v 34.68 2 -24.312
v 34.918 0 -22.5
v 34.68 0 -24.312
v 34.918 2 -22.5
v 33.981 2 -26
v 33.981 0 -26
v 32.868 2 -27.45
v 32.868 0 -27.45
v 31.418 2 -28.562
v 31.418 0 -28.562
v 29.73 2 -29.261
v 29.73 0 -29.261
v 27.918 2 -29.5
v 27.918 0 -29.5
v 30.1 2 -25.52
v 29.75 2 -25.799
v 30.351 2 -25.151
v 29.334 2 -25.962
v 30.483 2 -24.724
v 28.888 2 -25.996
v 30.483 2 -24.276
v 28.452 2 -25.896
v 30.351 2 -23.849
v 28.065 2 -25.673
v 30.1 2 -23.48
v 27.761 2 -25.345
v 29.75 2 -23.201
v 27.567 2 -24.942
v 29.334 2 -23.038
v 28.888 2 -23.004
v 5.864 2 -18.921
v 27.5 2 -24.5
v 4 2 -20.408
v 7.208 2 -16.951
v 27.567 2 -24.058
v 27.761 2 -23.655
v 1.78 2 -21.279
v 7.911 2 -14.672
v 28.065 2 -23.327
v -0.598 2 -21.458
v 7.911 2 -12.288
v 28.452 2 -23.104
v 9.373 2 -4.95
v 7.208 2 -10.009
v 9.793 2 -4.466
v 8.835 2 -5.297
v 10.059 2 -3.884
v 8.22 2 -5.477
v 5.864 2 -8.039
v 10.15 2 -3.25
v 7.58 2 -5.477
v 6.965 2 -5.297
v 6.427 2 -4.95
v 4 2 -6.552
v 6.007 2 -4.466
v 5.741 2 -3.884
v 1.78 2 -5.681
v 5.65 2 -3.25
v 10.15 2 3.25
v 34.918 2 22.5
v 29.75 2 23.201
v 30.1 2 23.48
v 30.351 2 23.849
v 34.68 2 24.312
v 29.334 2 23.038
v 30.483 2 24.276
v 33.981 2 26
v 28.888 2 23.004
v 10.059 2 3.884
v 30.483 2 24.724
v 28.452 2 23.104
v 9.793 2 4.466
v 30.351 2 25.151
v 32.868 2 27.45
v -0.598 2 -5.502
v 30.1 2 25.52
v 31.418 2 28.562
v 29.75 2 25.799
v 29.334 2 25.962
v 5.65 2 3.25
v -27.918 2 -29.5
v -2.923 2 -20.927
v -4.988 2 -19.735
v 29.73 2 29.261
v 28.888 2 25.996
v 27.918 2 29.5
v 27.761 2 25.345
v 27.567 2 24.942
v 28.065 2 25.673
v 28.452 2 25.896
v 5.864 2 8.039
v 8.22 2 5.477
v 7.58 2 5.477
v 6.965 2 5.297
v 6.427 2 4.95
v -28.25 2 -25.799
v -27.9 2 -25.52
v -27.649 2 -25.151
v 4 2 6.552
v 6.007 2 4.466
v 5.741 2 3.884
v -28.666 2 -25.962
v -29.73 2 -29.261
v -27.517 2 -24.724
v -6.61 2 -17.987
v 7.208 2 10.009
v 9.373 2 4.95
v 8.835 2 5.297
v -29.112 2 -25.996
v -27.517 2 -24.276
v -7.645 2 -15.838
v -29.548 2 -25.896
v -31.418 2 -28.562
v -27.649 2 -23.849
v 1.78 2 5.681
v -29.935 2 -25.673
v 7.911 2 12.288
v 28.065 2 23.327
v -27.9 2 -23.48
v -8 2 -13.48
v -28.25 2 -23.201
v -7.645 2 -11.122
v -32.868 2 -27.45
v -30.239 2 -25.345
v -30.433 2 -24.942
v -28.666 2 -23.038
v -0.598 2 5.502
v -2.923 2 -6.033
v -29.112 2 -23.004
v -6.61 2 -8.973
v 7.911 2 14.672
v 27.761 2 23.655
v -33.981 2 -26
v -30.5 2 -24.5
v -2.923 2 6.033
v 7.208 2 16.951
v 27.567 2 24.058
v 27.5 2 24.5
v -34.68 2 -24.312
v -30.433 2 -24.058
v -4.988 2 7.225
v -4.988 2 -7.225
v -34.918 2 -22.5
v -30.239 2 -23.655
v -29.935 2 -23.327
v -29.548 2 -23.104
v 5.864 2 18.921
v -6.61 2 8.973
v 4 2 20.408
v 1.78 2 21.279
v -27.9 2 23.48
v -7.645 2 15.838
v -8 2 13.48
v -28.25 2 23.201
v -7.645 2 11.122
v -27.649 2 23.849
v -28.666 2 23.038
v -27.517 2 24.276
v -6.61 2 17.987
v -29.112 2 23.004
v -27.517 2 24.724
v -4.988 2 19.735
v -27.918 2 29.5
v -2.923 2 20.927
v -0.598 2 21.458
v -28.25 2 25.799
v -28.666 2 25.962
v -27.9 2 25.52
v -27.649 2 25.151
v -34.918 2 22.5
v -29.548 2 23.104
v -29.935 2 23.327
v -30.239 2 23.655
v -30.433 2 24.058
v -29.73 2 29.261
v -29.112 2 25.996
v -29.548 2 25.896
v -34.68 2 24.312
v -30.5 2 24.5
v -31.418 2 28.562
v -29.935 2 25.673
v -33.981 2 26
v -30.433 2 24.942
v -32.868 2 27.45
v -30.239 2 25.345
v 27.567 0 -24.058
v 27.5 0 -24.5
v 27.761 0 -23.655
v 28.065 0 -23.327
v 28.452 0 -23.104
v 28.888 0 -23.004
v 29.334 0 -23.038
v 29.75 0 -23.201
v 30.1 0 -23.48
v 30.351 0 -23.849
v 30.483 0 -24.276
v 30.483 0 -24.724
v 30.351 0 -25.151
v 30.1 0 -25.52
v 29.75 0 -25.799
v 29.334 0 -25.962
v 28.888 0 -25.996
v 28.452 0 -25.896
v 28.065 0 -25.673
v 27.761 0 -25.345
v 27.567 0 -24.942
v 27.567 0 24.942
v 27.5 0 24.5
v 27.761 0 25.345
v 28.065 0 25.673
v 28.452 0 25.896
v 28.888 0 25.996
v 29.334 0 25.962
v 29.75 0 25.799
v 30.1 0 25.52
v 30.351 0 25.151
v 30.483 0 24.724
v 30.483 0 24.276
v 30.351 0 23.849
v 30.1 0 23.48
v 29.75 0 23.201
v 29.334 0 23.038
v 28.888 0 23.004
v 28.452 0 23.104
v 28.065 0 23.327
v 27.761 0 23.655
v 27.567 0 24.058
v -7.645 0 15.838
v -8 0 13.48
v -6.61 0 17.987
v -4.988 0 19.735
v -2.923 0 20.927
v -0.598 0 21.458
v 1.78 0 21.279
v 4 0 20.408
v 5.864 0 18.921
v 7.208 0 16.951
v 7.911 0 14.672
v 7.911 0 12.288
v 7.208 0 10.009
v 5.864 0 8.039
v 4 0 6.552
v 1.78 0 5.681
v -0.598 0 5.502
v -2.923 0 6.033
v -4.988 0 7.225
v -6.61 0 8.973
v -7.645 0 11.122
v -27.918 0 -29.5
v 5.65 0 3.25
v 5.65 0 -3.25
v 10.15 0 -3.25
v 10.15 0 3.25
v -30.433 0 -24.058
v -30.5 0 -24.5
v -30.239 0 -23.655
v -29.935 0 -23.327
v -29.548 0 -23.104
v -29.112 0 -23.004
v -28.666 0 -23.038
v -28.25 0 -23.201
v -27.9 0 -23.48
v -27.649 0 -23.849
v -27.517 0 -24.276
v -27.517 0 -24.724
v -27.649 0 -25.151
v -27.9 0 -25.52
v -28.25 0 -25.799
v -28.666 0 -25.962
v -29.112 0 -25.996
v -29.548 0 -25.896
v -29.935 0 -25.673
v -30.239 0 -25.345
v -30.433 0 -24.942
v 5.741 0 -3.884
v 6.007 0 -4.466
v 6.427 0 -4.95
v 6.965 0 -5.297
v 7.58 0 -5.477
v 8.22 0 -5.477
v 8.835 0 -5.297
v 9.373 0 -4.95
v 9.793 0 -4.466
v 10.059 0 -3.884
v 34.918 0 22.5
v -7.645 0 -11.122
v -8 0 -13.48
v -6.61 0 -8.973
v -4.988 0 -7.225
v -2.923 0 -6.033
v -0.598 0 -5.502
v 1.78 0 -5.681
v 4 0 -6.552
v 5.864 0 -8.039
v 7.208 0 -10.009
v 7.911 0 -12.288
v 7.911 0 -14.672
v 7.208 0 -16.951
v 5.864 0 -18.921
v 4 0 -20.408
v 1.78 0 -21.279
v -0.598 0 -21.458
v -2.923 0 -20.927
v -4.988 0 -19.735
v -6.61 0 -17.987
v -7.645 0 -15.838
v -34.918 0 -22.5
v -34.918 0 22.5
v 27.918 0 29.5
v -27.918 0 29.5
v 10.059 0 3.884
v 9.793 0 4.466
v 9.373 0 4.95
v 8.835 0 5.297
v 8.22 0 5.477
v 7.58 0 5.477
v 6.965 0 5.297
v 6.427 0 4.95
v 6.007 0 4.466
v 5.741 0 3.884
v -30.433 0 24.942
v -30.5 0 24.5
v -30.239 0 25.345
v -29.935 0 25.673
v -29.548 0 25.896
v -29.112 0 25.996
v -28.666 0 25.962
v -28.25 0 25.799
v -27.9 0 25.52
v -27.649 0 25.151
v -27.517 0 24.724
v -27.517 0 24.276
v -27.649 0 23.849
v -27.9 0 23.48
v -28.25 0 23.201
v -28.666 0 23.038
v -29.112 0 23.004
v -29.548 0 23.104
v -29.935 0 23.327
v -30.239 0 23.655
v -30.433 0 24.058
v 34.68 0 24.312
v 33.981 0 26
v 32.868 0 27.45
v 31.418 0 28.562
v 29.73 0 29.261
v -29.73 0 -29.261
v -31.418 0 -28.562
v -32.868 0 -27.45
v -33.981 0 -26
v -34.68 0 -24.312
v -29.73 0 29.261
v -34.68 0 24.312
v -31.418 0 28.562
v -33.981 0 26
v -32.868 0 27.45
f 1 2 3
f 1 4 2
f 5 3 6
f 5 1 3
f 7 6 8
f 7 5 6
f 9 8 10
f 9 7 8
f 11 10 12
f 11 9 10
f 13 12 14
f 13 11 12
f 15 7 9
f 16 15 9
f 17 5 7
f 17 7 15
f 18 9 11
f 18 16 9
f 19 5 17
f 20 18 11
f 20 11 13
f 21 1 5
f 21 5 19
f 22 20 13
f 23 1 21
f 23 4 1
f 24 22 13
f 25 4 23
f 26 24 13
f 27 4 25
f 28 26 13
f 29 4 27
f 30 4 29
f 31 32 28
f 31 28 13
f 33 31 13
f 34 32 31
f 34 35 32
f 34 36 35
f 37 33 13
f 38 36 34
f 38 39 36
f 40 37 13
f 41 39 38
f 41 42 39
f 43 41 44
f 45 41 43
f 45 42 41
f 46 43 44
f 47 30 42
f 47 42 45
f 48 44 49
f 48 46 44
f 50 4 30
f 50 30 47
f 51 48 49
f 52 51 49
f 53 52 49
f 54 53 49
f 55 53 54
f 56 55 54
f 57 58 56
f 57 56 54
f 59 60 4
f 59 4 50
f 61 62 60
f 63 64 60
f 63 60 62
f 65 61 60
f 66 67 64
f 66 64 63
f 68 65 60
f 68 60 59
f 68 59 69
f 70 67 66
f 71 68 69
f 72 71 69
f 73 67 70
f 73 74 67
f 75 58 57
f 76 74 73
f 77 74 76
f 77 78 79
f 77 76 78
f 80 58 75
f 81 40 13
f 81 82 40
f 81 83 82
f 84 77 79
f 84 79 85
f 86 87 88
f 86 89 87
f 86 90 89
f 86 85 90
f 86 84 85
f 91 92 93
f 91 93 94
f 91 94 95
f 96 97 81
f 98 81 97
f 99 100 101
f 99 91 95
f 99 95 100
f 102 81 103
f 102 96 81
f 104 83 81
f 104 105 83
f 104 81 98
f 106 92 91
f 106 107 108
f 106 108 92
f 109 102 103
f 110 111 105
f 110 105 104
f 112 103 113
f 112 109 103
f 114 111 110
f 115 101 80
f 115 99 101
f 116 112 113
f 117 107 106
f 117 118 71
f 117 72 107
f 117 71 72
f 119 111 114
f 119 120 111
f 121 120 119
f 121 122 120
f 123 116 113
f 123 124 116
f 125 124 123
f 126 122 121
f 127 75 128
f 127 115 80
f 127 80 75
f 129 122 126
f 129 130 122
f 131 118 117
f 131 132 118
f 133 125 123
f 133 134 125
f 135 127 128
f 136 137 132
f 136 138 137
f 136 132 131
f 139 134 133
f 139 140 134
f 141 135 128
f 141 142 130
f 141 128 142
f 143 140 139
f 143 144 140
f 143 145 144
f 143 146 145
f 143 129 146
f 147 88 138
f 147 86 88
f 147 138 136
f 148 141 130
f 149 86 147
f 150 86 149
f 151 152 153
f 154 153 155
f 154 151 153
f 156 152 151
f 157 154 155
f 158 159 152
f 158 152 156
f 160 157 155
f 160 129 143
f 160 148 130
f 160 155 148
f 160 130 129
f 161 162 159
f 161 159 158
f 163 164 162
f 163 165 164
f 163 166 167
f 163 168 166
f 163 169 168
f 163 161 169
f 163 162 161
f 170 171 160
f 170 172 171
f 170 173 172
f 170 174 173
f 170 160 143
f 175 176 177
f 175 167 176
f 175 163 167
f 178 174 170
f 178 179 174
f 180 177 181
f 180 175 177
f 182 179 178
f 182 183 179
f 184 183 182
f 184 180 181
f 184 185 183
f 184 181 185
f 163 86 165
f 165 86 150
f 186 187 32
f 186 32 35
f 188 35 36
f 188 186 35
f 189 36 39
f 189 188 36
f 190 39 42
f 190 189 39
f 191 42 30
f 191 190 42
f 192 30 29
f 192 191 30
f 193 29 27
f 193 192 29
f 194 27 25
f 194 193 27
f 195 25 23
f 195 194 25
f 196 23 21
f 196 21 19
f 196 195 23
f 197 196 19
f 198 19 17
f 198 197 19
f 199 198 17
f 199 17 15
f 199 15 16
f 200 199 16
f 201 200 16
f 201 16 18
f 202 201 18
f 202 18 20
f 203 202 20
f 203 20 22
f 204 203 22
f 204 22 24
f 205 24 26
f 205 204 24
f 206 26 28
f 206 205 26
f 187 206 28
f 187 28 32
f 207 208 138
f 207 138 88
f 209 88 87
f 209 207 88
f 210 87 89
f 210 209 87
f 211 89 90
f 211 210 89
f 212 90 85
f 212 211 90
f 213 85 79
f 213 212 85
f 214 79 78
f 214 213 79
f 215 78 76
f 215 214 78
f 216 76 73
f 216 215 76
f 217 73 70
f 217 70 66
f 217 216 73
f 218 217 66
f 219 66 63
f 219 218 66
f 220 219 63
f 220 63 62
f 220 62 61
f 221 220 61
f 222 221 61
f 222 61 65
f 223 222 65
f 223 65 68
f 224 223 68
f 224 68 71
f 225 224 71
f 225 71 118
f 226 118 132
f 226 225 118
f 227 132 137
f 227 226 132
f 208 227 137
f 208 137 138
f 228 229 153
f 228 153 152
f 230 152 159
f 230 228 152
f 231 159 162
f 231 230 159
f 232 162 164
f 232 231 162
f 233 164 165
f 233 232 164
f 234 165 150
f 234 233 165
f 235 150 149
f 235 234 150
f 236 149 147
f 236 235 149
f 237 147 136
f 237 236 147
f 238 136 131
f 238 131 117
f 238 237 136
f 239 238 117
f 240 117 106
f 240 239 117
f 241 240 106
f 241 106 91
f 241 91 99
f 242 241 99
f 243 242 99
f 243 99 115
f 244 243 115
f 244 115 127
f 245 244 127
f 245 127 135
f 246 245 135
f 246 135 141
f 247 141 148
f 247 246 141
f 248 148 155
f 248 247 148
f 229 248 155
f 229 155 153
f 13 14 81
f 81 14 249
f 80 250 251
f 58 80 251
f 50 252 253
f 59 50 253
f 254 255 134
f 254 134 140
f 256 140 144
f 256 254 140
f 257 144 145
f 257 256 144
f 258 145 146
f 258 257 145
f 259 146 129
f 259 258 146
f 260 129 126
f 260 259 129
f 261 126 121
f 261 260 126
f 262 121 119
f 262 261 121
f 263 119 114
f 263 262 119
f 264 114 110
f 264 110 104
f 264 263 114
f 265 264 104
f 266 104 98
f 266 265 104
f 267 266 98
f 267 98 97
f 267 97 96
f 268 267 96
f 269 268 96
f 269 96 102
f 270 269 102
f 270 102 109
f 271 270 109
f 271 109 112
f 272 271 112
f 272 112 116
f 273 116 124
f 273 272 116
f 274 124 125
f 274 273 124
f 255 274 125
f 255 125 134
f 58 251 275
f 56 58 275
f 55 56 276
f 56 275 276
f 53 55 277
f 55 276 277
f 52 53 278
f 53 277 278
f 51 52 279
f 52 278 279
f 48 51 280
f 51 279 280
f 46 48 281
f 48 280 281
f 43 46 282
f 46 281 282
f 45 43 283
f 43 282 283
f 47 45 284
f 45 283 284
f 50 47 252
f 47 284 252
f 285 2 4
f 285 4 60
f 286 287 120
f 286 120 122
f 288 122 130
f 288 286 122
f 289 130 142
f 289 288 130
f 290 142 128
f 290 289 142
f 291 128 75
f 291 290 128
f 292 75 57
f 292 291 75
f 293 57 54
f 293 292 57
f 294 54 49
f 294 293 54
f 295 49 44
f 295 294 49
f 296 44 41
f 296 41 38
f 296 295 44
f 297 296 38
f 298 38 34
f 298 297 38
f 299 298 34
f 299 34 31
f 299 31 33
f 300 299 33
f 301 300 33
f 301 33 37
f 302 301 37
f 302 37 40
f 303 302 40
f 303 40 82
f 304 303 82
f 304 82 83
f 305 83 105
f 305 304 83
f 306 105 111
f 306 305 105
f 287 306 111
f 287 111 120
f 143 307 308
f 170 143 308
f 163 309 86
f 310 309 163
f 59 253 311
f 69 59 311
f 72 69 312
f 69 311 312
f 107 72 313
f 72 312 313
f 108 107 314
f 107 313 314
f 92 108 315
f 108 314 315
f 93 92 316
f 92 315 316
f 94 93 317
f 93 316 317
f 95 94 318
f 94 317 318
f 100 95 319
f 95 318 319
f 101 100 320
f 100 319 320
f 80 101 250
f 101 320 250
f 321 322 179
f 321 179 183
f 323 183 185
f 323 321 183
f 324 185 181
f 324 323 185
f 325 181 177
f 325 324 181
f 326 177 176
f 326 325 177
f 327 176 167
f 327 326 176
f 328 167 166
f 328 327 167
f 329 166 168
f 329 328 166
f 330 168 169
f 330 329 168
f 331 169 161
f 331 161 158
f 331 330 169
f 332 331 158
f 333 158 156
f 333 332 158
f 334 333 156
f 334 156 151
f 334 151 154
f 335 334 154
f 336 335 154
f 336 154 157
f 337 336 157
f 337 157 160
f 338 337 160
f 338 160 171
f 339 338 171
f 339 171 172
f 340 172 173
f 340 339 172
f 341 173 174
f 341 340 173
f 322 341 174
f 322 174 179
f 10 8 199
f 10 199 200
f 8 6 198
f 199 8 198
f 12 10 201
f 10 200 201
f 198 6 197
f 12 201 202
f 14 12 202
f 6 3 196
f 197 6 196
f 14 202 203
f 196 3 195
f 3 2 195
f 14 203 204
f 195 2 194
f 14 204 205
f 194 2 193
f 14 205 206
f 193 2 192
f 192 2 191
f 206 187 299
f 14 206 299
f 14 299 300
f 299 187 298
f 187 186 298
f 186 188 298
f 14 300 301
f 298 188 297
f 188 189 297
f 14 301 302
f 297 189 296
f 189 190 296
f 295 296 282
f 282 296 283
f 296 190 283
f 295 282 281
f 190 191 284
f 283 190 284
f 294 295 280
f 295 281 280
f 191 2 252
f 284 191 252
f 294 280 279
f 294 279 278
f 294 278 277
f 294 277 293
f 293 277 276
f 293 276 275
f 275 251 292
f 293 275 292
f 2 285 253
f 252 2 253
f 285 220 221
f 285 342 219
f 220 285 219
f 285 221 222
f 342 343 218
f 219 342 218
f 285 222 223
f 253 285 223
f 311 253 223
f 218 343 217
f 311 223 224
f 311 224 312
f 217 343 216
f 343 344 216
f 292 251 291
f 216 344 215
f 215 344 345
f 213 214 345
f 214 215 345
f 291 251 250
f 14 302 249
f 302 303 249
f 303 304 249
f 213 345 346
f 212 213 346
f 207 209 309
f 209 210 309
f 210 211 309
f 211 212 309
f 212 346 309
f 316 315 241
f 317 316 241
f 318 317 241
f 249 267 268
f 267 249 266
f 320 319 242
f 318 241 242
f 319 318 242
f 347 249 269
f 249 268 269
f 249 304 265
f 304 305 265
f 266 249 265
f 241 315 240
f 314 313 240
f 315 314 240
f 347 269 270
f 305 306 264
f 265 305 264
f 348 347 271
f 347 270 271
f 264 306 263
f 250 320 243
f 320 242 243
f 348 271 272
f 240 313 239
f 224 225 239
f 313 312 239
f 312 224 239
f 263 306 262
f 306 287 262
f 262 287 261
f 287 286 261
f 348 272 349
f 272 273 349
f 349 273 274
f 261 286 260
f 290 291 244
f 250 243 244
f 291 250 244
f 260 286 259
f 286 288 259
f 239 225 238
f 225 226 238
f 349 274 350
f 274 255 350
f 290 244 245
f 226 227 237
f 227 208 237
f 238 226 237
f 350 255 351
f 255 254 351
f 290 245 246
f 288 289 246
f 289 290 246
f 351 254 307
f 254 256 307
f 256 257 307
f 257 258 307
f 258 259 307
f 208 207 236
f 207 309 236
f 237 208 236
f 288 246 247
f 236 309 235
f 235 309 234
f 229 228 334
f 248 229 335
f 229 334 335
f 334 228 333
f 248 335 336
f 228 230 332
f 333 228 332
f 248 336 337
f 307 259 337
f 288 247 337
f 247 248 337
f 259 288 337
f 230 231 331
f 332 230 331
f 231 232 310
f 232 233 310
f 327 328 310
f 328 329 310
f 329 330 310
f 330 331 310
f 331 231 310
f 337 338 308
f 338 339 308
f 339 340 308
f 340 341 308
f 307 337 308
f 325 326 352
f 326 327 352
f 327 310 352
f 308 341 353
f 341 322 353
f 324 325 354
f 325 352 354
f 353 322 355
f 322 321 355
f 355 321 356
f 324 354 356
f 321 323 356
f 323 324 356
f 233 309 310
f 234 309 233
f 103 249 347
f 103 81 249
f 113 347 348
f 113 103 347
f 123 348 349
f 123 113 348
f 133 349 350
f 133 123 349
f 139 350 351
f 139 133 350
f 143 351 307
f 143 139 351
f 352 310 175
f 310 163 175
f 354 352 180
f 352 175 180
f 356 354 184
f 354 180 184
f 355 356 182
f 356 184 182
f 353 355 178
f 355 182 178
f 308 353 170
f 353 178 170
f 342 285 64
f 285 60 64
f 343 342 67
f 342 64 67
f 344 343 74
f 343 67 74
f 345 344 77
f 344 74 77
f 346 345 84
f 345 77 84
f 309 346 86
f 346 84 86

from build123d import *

# Parameters (mm, degrees)
SKETCH_2_W      = 69.836734694
SKETCH_2_H      = 59
SKETCH_2_R      = 8
SKETCH_2_R_2    = 1.5
EXTRUDE_1_DEPTH = 2
FILLET_1_R      = 7


with BuildPart() as part:
    # 草圖2 → 填料-伸長1 (new body)
    with BuildSketch(Plane(origin=(0, 0, 0), x_dir=(-1, 0, 0), z_dir=(0, 1, 0))):
        Rectangle(SKETCH_2_W, SKETCH_2_H)
        with Locations((0, 13.48)):
            Circle(SKETCH_2_R, mode=Mode.SUBTRACT)
        with Locations((0, -13.48)):
            Circle(SKETCH_2_R, mode=Mode.SUBTRACT)
        with Locations((29, 24.5)):
            Circle(SKETCH_2_R_2, mode=Mode.SUBTRACT)
        with Locations((29, -24.5)):
            Circle(SKETCH_2_R_2, mode=Mode.SUBTRACT)
        with Locations((-29, 24.5)):
            Circle(SKETCH_2_R_2, mode=Mode.SUBTRACT)
        with Locations((-29, -24.5)):
            Circle(SKETCH_2_R_2, mode=Mode.SUBTRACT)
        with BuildLine():
            Line((-5.65, 3.25), (-5.65, -3.25))
            ThreePointArc((-5.65, -3.25), (-7.9, -5.5), (-10.15, -3.25))
            Line((-10.15, -3.25), (-10.15, 3.25))
            ThreePointArc((-10.15, 3.25), (-7.9, 5.5), (-5.65, 3.25))
        make_face(mode=Mode.SUBTRACT)
    extrude(amount=EXTRUDE_1_DEPTH)

    # 圓角1
    fillet_1_edges = [part.edges().sort_by_distance(p)[0] for p in [
        (-34.918367347, 1, -29.5),
        (34.918367347, 1, -29.5),
        (34.918367347, 1, 29.5),
        (-34.918367347, 1, 29.5),
    ]]
    fillet(fillet_1_edges, radius=FILLET_1_R)


solid = part.part
